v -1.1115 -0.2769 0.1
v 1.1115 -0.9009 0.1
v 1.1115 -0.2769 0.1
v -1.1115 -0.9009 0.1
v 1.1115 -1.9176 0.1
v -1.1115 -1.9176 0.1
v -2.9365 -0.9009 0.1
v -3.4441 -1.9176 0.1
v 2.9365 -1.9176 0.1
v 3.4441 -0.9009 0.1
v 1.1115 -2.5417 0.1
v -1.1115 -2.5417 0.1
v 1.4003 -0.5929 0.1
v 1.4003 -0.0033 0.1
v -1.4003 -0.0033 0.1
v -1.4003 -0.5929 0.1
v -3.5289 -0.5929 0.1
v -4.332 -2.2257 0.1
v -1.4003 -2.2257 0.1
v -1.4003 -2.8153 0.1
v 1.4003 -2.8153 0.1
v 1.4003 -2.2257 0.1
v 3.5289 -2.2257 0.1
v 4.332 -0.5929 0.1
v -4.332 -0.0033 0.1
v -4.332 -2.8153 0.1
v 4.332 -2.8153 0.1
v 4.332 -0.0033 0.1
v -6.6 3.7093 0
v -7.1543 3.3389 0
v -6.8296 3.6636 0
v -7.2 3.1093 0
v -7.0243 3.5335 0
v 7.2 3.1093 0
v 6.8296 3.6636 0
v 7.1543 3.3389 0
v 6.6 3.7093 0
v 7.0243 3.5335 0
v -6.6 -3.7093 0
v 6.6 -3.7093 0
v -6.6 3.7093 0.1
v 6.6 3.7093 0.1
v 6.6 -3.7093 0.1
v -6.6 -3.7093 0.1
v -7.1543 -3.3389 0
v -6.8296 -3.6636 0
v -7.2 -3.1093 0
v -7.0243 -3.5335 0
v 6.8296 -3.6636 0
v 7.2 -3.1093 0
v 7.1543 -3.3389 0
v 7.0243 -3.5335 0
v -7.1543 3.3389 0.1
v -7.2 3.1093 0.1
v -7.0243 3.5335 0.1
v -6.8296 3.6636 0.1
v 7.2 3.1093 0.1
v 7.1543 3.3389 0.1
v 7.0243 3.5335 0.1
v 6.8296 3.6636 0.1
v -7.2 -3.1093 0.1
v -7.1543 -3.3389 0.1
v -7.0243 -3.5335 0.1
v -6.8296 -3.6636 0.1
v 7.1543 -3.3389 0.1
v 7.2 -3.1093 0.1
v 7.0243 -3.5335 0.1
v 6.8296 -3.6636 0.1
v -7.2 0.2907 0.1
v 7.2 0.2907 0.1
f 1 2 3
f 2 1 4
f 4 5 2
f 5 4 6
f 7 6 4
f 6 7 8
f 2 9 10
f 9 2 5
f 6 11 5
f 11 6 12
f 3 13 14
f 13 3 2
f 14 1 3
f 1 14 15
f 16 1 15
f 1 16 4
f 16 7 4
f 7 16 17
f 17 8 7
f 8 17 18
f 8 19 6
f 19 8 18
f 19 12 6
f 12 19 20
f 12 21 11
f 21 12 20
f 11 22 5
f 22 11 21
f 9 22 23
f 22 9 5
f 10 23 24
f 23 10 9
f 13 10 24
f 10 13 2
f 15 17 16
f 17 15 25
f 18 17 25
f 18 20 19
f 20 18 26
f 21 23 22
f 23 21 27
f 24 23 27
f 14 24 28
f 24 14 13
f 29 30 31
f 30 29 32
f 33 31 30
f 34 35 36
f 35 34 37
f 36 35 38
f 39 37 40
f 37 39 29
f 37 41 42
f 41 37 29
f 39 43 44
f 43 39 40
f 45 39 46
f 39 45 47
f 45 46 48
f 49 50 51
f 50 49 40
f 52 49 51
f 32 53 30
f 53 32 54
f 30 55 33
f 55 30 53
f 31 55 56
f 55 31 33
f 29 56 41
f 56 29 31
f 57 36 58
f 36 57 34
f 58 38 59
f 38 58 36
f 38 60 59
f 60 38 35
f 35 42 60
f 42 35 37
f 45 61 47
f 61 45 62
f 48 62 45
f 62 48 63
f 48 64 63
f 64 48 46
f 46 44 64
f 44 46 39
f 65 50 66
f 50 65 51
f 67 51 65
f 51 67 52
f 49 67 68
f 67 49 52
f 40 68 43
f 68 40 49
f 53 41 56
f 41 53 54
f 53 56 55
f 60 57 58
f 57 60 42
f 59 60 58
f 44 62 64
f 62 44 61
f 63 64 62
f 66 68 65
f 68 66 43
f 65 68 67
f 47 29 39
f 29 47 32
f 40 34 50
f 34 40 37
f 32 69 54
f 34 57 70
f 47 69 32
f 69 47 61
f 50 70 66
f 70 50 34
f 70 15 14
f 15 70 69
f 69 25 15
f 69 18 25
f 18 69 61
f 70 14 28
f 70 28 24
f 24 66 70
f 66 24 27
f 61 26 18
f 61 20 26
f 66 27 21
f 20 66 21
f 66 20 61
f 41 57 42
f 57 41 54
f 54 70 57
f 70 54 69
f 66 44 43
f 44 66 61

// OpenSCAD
// file: ../p/logo-chevrolet-icon.scad
use <../lib.scad>
function ldraw_lib__logo_chevrolet_icon() = [
// 0 Logo Chevrolet Icon
// 0 Name: logo-chevrolet-icon.dat
// 0 Author: Massimo Maso [Sirio]
// 0 !LDRAW_ORG Primitive UPDATE 2024-08
// 0 !LICENSE Licensed under CC BY 4.0 : see CAreadme.txt
// 
// 0 !HELP Exact dimensions X = 28.5; Z = 18.5
// 
// 0 BFC CERTIFY CCW
  [0,"BFC","CERTIFY"],
  [0,"BFC","CCW"],
// 
// 0 !HISTORY 2024-09-30 [OrionP] Official Update 2024-08
// 
// 0 // Fillin of the cross
// 4 14 -3.6563 0 1.6722 3.6563 0 1.6722 3.6563 0 3.725 -3.6563 0 3.725
  [4,14,-3.6563,0,1.6722,3.6563,0,1.6722,3.6563,0,3.725,-3.6563,0,3.725],
// 4 14 -3.6563 0 1.6722 -3.6563 0 -1.6722 3.6563 0 -1.6722 3.6563 0 1.6722
  [4,14,-3.6563,0,1.6722,-3.6563,0,-1.6722,3.6563,0,-1.6722,3.6563,0,1.6722],
// 4 14 -3.6563 0 1.6722 -9.6597 0 1.6722 -11.3292 0 -1.6722 -3.6563 0 -1.6722
  [4,14,-3.6563,0,1.6722,-9.6597,0,1.6722,-11.3292,0,-1.6722,-3.6563,0,-1.6722],
// 4 14 3.6563 0 -1.6722 9.6597 0 -1.6722 11.3292 0 1.6722 3.6563 0 1.6722
  [4,14,3.6563,0,-1.6722,9.6597,0,-1.6722,11.3292,0,1.6722,3.6563,0,1.6722],
// 4 14 3.6563 0 -1.6722 -3.6563 0 -1.6722 -3.6563 0 -3.725 3.6563 0 -3.725
  [4,14,3.6563,0,-1.6722,-3.6563,0,-1.6722,-3.6563,0,-3.725,3.6563,0,-3.725],
// 0 // Border
// 4 7 3.6563 0 3.725 3.6563 0 1.6722 4.6062 0 2.6855 4.6062 0 4.625
  [4,7,3.6563,0,3.725,3.6563,0,1.6722,4.6062,0,2.6855,4.6062,0,4.625],
// 4 7 3.6563 0 3.725 4.6062 0 4.625 -4.6062 0 4.625 -3.6563 0 3.725
  [4,7,3.6563,0,3.725,4.6062,0,4.625,-4.6062,0,4.625,-3.6563,0,3.725],
// 4 7 -3.6563 0 1.6722 -3.6563 0 3.725 -4.6062 0 4.625 -4.6062 0 2.6855
  [4,7,-3.6563,0,1.6722,-3.6563,0,3.725,-4.6062,0,4.625,-4.6062,0,2.6855],
// 4 7 -3.6563 0 1.6722 -4.6062 0 2.6855 -11.6082 0 2.6855 -9.6597 0 1.6722
  [4,7,-3.6563,0,1.6722,-4.6062,0,2.6855,-11.6082,0,2.6855,-9.6597,0,1.6722],
// 4 7 -11.3292 0 -1.6722 -9.6597 0 1.6722 -11.6082 0 2.6855 -14.25 0 -2.6855
  [4,7,-11.3292,0,-1.6722,-9.6597,0,1.6722,-11.6082,0,2.6855,-14.25,0,-2.6855],
// 4 7 -11.3292 0 -1.6722 -14.25 0 -2.6855 -4.6062 0 -2.6855 -3.6563 0 -1.6722
  [4,7,-11.3292,0,-1.6722,-14.25,0,-2.6855,-4.6062,0,-2.6855,-3.6563,0,-1.6722],
// 4 7 -3.6563 0 -3.725 -3.6563 0 -1.6722 -4.6062 0 -2.6855 -4.6062 0 -4.625
  [4,7,-3.6563,0,-3.725,-3.6563,0,-1.6722,-4.6062,0,-2.6855,-4.6062,0,-4.625],
// 4 7 -3.6563 0 -3.725 -4.6062 0 -4.625 4.6062 0 -4.625 3.6563 0 -3.725
  [4,7,-3.6563,0,-3.725,-4.6062,0,-4.625,4.6062,0,-4.625,3.6563,0,-3.725],
// 4 7 3.6563 0 -1.6722 3.6563 0 -3.725 4.6062 0 -4.625 4.6062 0 -2.6855
  [4,7,3.6563,0,-1.6722,3.6563,0,-3.725,4.6062,0,-4.625,4.6062,0,-2.6855],
// 4 7 3.6563 0 -1.6722 4.6062 0 -2.6855 11.6082 0 -2.6855 9.6597 0 -1.6722
  [4,7,3.6563,0,-1.6722,4.6062,0,-2.6855,11.6082,0,-2.6855,9.6597,0,-1.6722],
// 4 7 11.3292 0 1.6722 9.6597 0 -1.6722 11.6082 0 -2.6855 14.25 0 2.6855
  [4,7,11.3292,0,1.6722,9.6597,0,-1.6722,11.6082,0,-2.6855,14.25,0,2.6855],
// 4 7 11.3292 0 1.6722 14.25 0 2.6855 4.6062 0 2.6855 3.6563 0 1.6722
  [4,7,11.3292,0,1.6722,14.25,0,2.6855,4.6062,0,2.6855,3.6563,0,1.6722],
];
module ldraw_lib__logo_chevrolet_icon(step=0, col=false, unit=2/5, alt=false, line=0.2, solid=!$preview)
    makepoly(ldraw_lib__logo_chevrolet_icon(), step=step, col=col, unit=unit, alt=alt, line=line, solid=solid);
ldraw_lib__logo_chevrolet_icon(line=0.2);
// file: ../p/logo-chevrolet-icon-box.scad
use <../lib.scad>
function ldraw_lib__logo_chevrolet_icon_box() = [
// 0 Logo Chevrolet Icon Outerbox
// 0 Name: logo-chevrolet-icon-box.dat
// 0 Author: Massimo Maso [Sirio]
// 0 !LDRAW_ORG Primitive UPDATE 2024-08
// 0 !LICENSE Licensed under CC BY 4.0 : see CAreadme.txt
// 
// 0 !HELP Exact dimensions X = 28.5; Z = 18.5
// 
// 0 BFC CERTIFY CCW
  [0,"BFC","CERTIFY"],
  [0,"BFC","CCW"],
// 
// 0 !HISTORY 2024-09-30 [OrionP] Official Update 2024-08
// 
// 0 // Outerbox
// 4 16 -14.25 0 4.625 -11.6082 0 2.6855 -4.6062 0 2.6855 -4.6062 0 4.625
  [4,16,-14.25,0,4.625,-11.6082,0,2.6855,-4.6062,0,2.6855,-4.6062,0,4.625],
// 3 16 -14.25 0 -2.6855 -11.6082 0 2.6855 -14.25 0 4.625
  [3,16,-14.25,0,-2.6855,-11.6082,0,2.6855,-14.25,0,4.625],
// 4 16 -14.25 0 -2.6855 -14.25 0 -4.625 -4.6062 0 -4.625 -4.6062 0 -2.6855
  [4,16,-14.25,0,-2.6855,-14.25,0,-4.625,-4.6062,0,-4.625,-4.6062,0,-2.6855],
// 4 16 14.25 0 -4.625 11.6082 0 -2.6855 4.6062 0 -2.6855 4.6062 0 -4.625
  [4,16,14.25,0,-4.625,11.6082,0,-2.6855,4.6062,0,-2.6855,4.6062,0,-4.625],
// 3 16 14.25 0 2.6855 11.6082 0 -2.6855 14.25 0 -4.625
  [3,16,14.25,0,2.6855,11.6082,0,-2.6855,14.25,0,-4.625],
// 4 16 14.25 0 2.6855 14.25 0 4.625 4.6062 0 4.625 4.6062 0 2.6855
  [4,16,14.25,0,2.6855,14.25,0,4.625,4.6062,0,4.625,4.6062,0,2.6855],
];
module ldraw_lib__logo_chevrolet_icon_box(step=0, col=false, unit=2/5, alt=false, line=0.2, solid=!$preview)
    makepoly(ldraw_lib__logo_chevrolet_icon_box(), step=step, col=col, unit=unit, alt=alt, line=line, solid=solid);
ldraw_lib__logo_chevrolet_icon_box(line=0.2);
// file: ../p/box3u12.scad
use <../lib.scad>
function ldraw_lib__box3u12() = [
// 0 Box with 3 Parallel Faces without Any Edges
// 0 Name: box3u12.dat
// 0 Author: J.C. Tchang [tchang]
// 0 !LDRAW_ORG Primitive UPDATE 2014-02
// 0 !LICENSE Licensed under CC BY 4.0 : see CAreadme.txt
// 
// 0 BFC CERTIFY CCW
  [0,"BFC","CERTIFY"],
  [0,"BFC","CCW"],
// 
// 0 !HISTORY 2014-12-23 [PTadmin] Official Update 2014-02
// 
// 
// 4 16 -1 1 1 1 1 1 1 1 -1 -1 1 -1
  [4,16,-1,1,1,1,1,1,1,1,-1,-1,1,-1],
// 4 16 -1 1 1 -1 0 1 1 0 1 1 1 1
  [4,16,-1,1,1,-1,0,1,1,0,1,1,1,1],
// 4 16 1 1 -1 1 0 -1 -1 0 -1 -1 1 -1
  [4,16,1,1,-1,1,0,-1,-1,0,-1,-1,1,-1],
];
module ldraw_lib__box3u12(step=0, col=false, unit=2/5, alt=false, line=0.2, solid=!$preview)
    makepoly(ldraw_lib__box3u12(), step=step, col=col, unit=unit, alt=alt, line=line, solid=solid);
ldraw_lib__box3u12(line=0.2);
// file: ../p/1-4cyli.scad
use <../lib.scad>
function ldraw_lib__1_4cyli() = [
// 0 Cylinder 0.25
// 0 Name: 1-4cyli.dat
// 0 Author: James Jessiman
// 0 !LDRAW_ORG Primitive UPDATE 2012-01
// 0 !LICENSE Licensed under CC BY 4.0 : see CAreadme.txt
// 
// 0 BFC CERTIFY CCW
  [0,"BFC","CERTIFY"],
  [0,"BFC","CCW"],
// 
// 0 !HISTORY 2002-03-23 [sbliss] Added BFC statement.
// 0 !HISTORY 2002-04-25 [PTadmin] Official Update 2002-02
// 0 !HISTORY 2007-06-22 [PTadmin] Header formatted for Contributor Agreement
// 0 !HISTORY 2008-07-01 [PTadmin] Official Update 2008-01
// 0 !HISTORY 2012-02-16 [Philo] Changed to CCW
// 0 !HISTORY 2012-03-30 [PTadmin] Official Update 2012-01
// 
// 
// 4 16 1 1 0 0.9239 1 0.3827 0.9239 0 0.3827 1 0 0
  [4,16,1,1,0,0.9239,1,0.3827,0.9239,0,0.3827,1,0,0],
// 5 24 1 0 0 1 1 0 0.9239 0 0.3827 1 0 -1
  [5,24,1,0,0,1,1,0,0.9239,0,0.3827,1,0,-1],
// 4 16 0.9239 1 0.3827 0.7071 1 0.7071 0.7071 0 0.7071 0.9239 0 0.3827
  [4,16,0.9239,1,0.3827,0.7071,1,0.7071,0.7071,0,0.7071,0.9239,0,0.3827],
// 5 24 0.9239 0 0.3827 0.9239 1 0.3827 0.7071 0 0.7071 1 0 0
  [5,24,0.9239,0,0.3827,0.9239,1,0.3827,0.7071,0,0.7071,1,0,0],
// 4 16 0.7071 1 0.7071 0.3827 1 0.9239 0.3827 0 0.9239 0.7071 0 0.7071
  [4,16,0.7071,1,0.7071,0.3827,1,0.9239,0.3827,0,0.9239,0.7071,0,0.7071],
// 5 24 0.7071 0 0.7071 0.7071 1 0.7071 0.3827 0 0.9239 0.9239 0 0.3827
  [5,24,0.7071,0,0.7071,0.7071,1,0.7071,0.3827,0,0.9239,0.9239,0,0.3827],
// 4 16 0.3827 1 0.9239 0 1 1 0 0 1 0.3827 0 0.9239
  [4,16,0.3827,1,0.9239,0,1,1,0,0,1,0.3827,0,0.9239],
// 5 24 0.3827 0 0.9239 0.3827 1 0.9239 0 0 1 0.7071 0 0.7071
  [5,24,0.3827,0,0.9239,0.3827,1,0.9239,0,0,1,0.7071,0,0.7071],
// 5 24 0 0 1 0 1 1 0.3827 0 0.9239 -1 0 1
  [5,24,0,0,1,0,1,1,0.3827,0,0.9239,-1,0,1],
];
module ldraw_lib__1_4cyli(step=0, col=false, unit=2/5, alt=false, line=0.2, solid=!$preview)
    makepoly(ldraw_lib__1_4cyli(), step=step, col=col, unit=unit, alt=alt, line=line, solid=solid);
ldraw_lib__1_4cyli(line=0.2);
// file: ../p/1-4chrd.scad
use <../lib.scad>
function ldraw_lib__1_4chrd() = [
// 0 Chord 0.25
// 0 Name: 1-4chrd.dat
// 0 Author: Max Martin Richter [MMR1988]
// 0 !LDRAW_ORG Primitive UPDATE 2023-05
// 0 !LICENSE Licensed under CC BY 4.0 : see CAreadme.txt
// 
// 0 BFC CERTIFY CCW
  [0,"BFC","CERTIFY"],
  [0,"BFC","CCW"],
// 
// 0 !HISTORY 2004-04-22 [PTadmin] Official Update 2004-02
// 0 !HISTORY 2007-10-09 [PTadmin] Header formatted for Contributor Agreement
// 0 !HISTORY 2008-07-01 [PTadmin] Official Update 2008-01
// 0 !HISTORY 2012-08-02 [MMR1988] Re-creation with PrimGen2 and Rectifier
// 0 !HISTORY 2012-08-09 [PTadmin] Official Update 2012-02
// 0 !HISTORY 2023-10-27 [OrionP] Change author to MMR1988 from hafhead
// 0 !HISTORY 2023-10-31 [OrionP] Official Update 2023-05
// 
// 4 16 0.9239 0 0.3827 0.3827 0 0.9239 0 0 1 1 0 0
  [4,16,0.9239,0,0.3827,0.3827,0,0.9239,0,0,1,1,0,0],
// 3 16 0.7071 0 0.7071 0.3827 0 0.9239 0.9239 0 0.3827
  [3,16,0.7071,0,0.7071,0.3827,0,0.9239,0.9239,0,0.3827],
];
module ldraw_lib__1_4chrd(step=0, col=false, unit=2/5, alt=false, line=0.2, solid=!$preview)
    makepoly(ldraw_lib__1_4chrd(), step=step, col=col, unit=unit, alt=alt, line=line, solid=solid);
ldraw_lib__1_4chrd(line=0.2);
// main file
use <../lib.scad>
use <../p/1-4chrd.scad>
use <../p/1-4cyli.scad>
use <../p/box3u12.scad>
use <../p/logo-chevrolet-icon-box.scad>
use <../p/logo-chevrolet-icon.scad>
function ldraw_lib__6142617q() = [
// 0 Sticker  0.9 x  1.8 with Chevrolet Logo on Black Stripe on Red Background
// 0 Name: 6142617q.dat
// 0 Author: Massimo Maso [Sirio]
// 0 !LDRAW_ORG Part UPDATE 2024-08
// 0 !LICENSE Licensed under CC BY 4.0 : see CAreadme.txt
// 
// 0 BFC CERTIFY CCW
  [0,"BFC","CERTIFY"],
  [0,"BFC","CCW"],
// 
// 0 !KEYWORDS Camaro, Chevrolet, Drag, Race, Set 75874, Speed Champions, SS
// 
// 0 !HISTORY 2024-09-30 [OrionP] Official Update 2024-08
// 
// 0 // Logo primitives
// 1 0 0 -.25 -3.5232 .76 0 0 0 1 0 0 0 .76 logo-chevrolet-icon.dat
  [1,0,0,-.25,-3.5232,.76,0,0,0,1,0,0,0,.76, ldraw_lib__logo_chevrolet_icon()],
// 1 0 0 -.25 -3.5232 .76 0 0 0 1 0 0 0 .76 logo-chevrolet-icon-box.dat
  [1,0,0,-.25,-3.5232,.76,0,0,0,1,0,0,0,.76, ldraw_lib__logo_chevrolet_icon_box()],
// 0 // Primitives
// 1 16 -16.5 0 7.7732 -1.5 0 0 0 -1 0 0 0 1.5 1-4chrd.dat
  [1,16,-16.5,0,7.7732,-1.5,0,0,0,-1,0,0,0,1.5, ldraw_lib__1_4chrd()],
// 1 16 16.5 0 7.7732 1.5 0 0 0 -1 0 0 0 1.5 1-4chrd.dat
  [1,16,16.5,0,7.7732,1.5,0,0,0,-1,0,0,0,1.5, ldraw_lib__1_4chrd()],
// 1 16 0 -.25 0 16.5 0 0 0 .25 0 0 0 9.2732 box3u12.dat
  [1,16,0,-.25,0,16.5,0,0,0,.25,0,0,0,9.2732, ldraw_lib__box3u12()],
// 1 16 -16.5 0 -7.7732 -1.5 0 0 0 -1 0 0 0 -1.5 1-4chrd.dat
  [1,16,-16.5,0,-7.7732,-1.5,0,0,0,-1,0,0,0,-1.5, ldraw_lib__1_4chrd()],
// 1 16 16.5 0 -7.7732 1.5 0 0 0 -1 0 0 0 -1.5 1-4chrd.dat
  [1,16,16.5,0,-7.7732,1.5,0,0,0,-1,0,0,0,-1.5, ldraw_lib__1_4chrd()],
// 1 16 -16.5 0 7.7732 -1.5 0 0 0 -.25 0 0 0 1.5 1-4cyli.dat
  [1,16,-16.5,0,7.7732,-1.5,0,0,0,-.25,0,0,0,1.5, ldraw_lib__1_4cyli()],
// 1 16 16.5 0 7.7732 1.5 0 0 0 -.25 0 0 0 1.5 1-4cyli.dat
  [1,16,16.5,0,7.7732,1.5,0,0,0,-.25,0,0,0,1.5, ldraw_lib__1_4cyli()],
// 1 16 -16.5 0 -7.7732 -1.5 0 0 0 -.25 0 0 0 -1.5 1-4cyli.dat
  [1,16,-16.5,0,-7.7732,-1.5,0,0,0,-.25,0,0,0,-1.5, ldraw_lib__1_4cyli()],
// 1 16 16.5 0 -7.7732 1.5 0 0 0 -.25 0 0 0 -1.5 1-4cyli.dat
  [1,16,16.5,0,-7.7732,1.5,0,0,0,-.25,0,0,0,-1.5, ldraw_lib__1_4cyli()],
// 1 4 -16.5 -.25 7.7732 -1.5 0 0 0 1 0 0 0 1.5 1-4chrd.dat
  [1,4,-16.5,-.25,7.7732,-1.5,0,0,0,1,0,0,0,1.5, ldraw_lib__1_4chrd()],
// 1 4 16.5 -.25 7.7732 1.5 0 0 0 1 0 0 0 1.5 1-4chrd.dat
  [1,4,16.5,-.25,7.7732,1.5,0,0,0,1,0,0,0,1.5, ldraw_lib__1_4chrd()],
// 1 4 -16.5 -.25 -7.7732 -1.5 0 0 0 1 0 0 0 -1.5 1-4chrd.dat
  [1,4,-16.5,-.25,-7.7732,-1.5,0,0,0,1,0,0,0,-1.5, ldraw_lib__1_4chrd()],
// 1 4 16.5 -.25 -7.7732 1.5 0 0 0 1 0 0 0 -1.5 1-4chrd.dat
  [1,4,16.5,-.25,-7.7732,1.5,0,0,0,1,0,0,0,-1.5, ldraw_lib__1_4chrd()],
// 0 // Bottom face
// 4 16 -16.5 0 9.2732 -16.5 0 -9.2732 -18 0 -7.7732 -18 0 7.7732
  [4,16,-16.5,0,9.2732,-16.5,0,-9.2732,-18,0,-7.7732,-18,0,7.7732],
// 4 16 16.5 0 9.2732 18 0 7.7732 18 0 -7.7732 16.5 0 -9.2732
  [4,16,16.5,0,9.2732,18,0,7.7732,18,0,-7.7732,16.5,0,-9.2732],
// 0 // Lateral face
// 3 16 -18 0 7.7732 -18 -.25 .7268 -18 -.25 7.7732
  [3,16,-18,0,7.7732,-18,-.25,.7268,-18,-.25,7.7732],
// 3 16 18 0 7.7732 18 -.25 7.7732 18 -.25 .7268
  [3,16,18,0,7.7732,18,-.25,7.7732,18,-.25,.7268],
// 4 16 -18 0 7.7732 -18 0 -7.7732 -18 -.25 -7.7732 -18 -.25 .7268
  [4,16,-18,0,7.7732,-18,0,-7.7732,-18,-.25,-7.7732,-18,-.25,.7268],
// 4 16 18 0 7.7732 18 -.25 .7268 18 -.25 -7.7732 18 0 -7.7732
  [4,16,18,0,7.7732,18,-.25,.7268,18,-.25,-7.7732,18,0,-7.7732],
// 0 // Top face
// 0 // Black faces
// 4 0 -18 -.25 .7268 -3.500712 -.25 -.0082 3.500712 -.25 -.0082 18 -.25 .7268
  [4,0,-18,-.25,.7268,-3.500712,-.25,-.0082,3.500712,-.25,-.0082,18,-.25,.7268],
// 3 0 -18 -.25 .7268 -10.83 -.25 -.0082 -3.500712 -.25 -.0082
  [3,0,-18,-.25,.7268,-10.83,-.25,-.0082,-3.500712,-.25,-.0082],
// 4 0 -18 -.25 .7268 -18 -.25 -7.7732 -10.83 -.25 -5.56418 -10.83 -.25 -.0082
  [4,0,-18,-.25,.7268,-18,-.25,-7.7732,-10.83,-.25,-5.56418,-10.83,-.25,-.0082],
// 3 0 18 -.25 .7268 3.500712 -.25 -.0082 10.83 -.25 -.0082
  [3,0,18,-.25,.7268,3.500712,-.25,-.0082,10.83,-.25,-.0082],
// 3 0 18 -.25 .7268 10.83 -.25 -.0082 10.83 -.25 -1.48222
  [3,0,18,-.25,.7268,10.83,-.25,-.0082,10.83,-.25,-1.48222],
// 4 0 18 -.25 .7268 10.83 -.25 -1.48222 10.83 -.25 -7.0382 18 -.25 -7.7732
  [4,0,18,-.25,.7268,10.83,-.25,-1.48222,10.83,-.25,-7.0382,18,-.25,-7.7732],
// 3 0 -18 -.25 -7.7732 -10.83 -.25 -7.0382 -10.83 -.25 -5.56418
  [3,0,-18,-.25,-7.7732,-10.83,-.25,-7.0382,-10.83,-.25,-5.56418],
// 3 0 -18 -.25 -7.7732 -3.500712 -.25 -7.0382 -10.83 -.25 -7.0382
  [3,0,-18,-.25,-7.7732,-3.500712,-.25,-7.0382,-10.83,-.25,-7.0382],
// 3 0 18 -.25 -7.7732 10.83 -.25 -7.0382 3.500712 -.25 -7.0382
  [3,0,18,-.25,-7.7732,10.83,-.25,-7.0382,3.500712,-.25,-7.0382],
// 4 0 18 -.25 -7.7732 3.500712 -.25 -7.0382 -3.500712 -.25 -7.0382 -18 -.25 -7.7732
  [4,0,18,-.25,-7.7732,3.500712,-.25,-7.0382,-3.500712,-.25,-7.0382,-18,-.25,-7.7732],
// 0 // Red faces
// 4 4 -18 -.25 7.7732 18 -.25 7.7732 16.5 -.25 9.2732 -16.5 -.25 9.2732
  [4,4,-18,-.25,7.7732,18,-.25,7.7732,16.5,-.25,9.2732,-16.5,-.25,9.2732],
// 4 4 -18 -.25 7.7732 -18 -.25 .7268 18 -.25 .7268 18 -.25 7.7732
  [4,4,-18,-.25,7.7732,-18,-.25,.7268,18,-.25,.7268,18,-.25,7.7732],
// 4 4 -18 -.25 -7.7732 -16.5 -.25 -9.2732 16.5 -.25 -9.2732 18 -.25 -7.7732
  [4,4,-18,-.25,-7.7732,-16.5,-.25,-9.2732,16.5,-.25,-9.2732,18,-.25,-7.7732],
];
module ldraw_lib__6142617q(step=0, col=false, unit=2/5, alt=false, line=0.2, solid=!$preview)
    makepoly(ldraw_lib__6142617q(), step=step, col=col, unit=unit, alt=alt, line=line, solid=solid);
ldraw_lib__6142617q(line=0.2);
